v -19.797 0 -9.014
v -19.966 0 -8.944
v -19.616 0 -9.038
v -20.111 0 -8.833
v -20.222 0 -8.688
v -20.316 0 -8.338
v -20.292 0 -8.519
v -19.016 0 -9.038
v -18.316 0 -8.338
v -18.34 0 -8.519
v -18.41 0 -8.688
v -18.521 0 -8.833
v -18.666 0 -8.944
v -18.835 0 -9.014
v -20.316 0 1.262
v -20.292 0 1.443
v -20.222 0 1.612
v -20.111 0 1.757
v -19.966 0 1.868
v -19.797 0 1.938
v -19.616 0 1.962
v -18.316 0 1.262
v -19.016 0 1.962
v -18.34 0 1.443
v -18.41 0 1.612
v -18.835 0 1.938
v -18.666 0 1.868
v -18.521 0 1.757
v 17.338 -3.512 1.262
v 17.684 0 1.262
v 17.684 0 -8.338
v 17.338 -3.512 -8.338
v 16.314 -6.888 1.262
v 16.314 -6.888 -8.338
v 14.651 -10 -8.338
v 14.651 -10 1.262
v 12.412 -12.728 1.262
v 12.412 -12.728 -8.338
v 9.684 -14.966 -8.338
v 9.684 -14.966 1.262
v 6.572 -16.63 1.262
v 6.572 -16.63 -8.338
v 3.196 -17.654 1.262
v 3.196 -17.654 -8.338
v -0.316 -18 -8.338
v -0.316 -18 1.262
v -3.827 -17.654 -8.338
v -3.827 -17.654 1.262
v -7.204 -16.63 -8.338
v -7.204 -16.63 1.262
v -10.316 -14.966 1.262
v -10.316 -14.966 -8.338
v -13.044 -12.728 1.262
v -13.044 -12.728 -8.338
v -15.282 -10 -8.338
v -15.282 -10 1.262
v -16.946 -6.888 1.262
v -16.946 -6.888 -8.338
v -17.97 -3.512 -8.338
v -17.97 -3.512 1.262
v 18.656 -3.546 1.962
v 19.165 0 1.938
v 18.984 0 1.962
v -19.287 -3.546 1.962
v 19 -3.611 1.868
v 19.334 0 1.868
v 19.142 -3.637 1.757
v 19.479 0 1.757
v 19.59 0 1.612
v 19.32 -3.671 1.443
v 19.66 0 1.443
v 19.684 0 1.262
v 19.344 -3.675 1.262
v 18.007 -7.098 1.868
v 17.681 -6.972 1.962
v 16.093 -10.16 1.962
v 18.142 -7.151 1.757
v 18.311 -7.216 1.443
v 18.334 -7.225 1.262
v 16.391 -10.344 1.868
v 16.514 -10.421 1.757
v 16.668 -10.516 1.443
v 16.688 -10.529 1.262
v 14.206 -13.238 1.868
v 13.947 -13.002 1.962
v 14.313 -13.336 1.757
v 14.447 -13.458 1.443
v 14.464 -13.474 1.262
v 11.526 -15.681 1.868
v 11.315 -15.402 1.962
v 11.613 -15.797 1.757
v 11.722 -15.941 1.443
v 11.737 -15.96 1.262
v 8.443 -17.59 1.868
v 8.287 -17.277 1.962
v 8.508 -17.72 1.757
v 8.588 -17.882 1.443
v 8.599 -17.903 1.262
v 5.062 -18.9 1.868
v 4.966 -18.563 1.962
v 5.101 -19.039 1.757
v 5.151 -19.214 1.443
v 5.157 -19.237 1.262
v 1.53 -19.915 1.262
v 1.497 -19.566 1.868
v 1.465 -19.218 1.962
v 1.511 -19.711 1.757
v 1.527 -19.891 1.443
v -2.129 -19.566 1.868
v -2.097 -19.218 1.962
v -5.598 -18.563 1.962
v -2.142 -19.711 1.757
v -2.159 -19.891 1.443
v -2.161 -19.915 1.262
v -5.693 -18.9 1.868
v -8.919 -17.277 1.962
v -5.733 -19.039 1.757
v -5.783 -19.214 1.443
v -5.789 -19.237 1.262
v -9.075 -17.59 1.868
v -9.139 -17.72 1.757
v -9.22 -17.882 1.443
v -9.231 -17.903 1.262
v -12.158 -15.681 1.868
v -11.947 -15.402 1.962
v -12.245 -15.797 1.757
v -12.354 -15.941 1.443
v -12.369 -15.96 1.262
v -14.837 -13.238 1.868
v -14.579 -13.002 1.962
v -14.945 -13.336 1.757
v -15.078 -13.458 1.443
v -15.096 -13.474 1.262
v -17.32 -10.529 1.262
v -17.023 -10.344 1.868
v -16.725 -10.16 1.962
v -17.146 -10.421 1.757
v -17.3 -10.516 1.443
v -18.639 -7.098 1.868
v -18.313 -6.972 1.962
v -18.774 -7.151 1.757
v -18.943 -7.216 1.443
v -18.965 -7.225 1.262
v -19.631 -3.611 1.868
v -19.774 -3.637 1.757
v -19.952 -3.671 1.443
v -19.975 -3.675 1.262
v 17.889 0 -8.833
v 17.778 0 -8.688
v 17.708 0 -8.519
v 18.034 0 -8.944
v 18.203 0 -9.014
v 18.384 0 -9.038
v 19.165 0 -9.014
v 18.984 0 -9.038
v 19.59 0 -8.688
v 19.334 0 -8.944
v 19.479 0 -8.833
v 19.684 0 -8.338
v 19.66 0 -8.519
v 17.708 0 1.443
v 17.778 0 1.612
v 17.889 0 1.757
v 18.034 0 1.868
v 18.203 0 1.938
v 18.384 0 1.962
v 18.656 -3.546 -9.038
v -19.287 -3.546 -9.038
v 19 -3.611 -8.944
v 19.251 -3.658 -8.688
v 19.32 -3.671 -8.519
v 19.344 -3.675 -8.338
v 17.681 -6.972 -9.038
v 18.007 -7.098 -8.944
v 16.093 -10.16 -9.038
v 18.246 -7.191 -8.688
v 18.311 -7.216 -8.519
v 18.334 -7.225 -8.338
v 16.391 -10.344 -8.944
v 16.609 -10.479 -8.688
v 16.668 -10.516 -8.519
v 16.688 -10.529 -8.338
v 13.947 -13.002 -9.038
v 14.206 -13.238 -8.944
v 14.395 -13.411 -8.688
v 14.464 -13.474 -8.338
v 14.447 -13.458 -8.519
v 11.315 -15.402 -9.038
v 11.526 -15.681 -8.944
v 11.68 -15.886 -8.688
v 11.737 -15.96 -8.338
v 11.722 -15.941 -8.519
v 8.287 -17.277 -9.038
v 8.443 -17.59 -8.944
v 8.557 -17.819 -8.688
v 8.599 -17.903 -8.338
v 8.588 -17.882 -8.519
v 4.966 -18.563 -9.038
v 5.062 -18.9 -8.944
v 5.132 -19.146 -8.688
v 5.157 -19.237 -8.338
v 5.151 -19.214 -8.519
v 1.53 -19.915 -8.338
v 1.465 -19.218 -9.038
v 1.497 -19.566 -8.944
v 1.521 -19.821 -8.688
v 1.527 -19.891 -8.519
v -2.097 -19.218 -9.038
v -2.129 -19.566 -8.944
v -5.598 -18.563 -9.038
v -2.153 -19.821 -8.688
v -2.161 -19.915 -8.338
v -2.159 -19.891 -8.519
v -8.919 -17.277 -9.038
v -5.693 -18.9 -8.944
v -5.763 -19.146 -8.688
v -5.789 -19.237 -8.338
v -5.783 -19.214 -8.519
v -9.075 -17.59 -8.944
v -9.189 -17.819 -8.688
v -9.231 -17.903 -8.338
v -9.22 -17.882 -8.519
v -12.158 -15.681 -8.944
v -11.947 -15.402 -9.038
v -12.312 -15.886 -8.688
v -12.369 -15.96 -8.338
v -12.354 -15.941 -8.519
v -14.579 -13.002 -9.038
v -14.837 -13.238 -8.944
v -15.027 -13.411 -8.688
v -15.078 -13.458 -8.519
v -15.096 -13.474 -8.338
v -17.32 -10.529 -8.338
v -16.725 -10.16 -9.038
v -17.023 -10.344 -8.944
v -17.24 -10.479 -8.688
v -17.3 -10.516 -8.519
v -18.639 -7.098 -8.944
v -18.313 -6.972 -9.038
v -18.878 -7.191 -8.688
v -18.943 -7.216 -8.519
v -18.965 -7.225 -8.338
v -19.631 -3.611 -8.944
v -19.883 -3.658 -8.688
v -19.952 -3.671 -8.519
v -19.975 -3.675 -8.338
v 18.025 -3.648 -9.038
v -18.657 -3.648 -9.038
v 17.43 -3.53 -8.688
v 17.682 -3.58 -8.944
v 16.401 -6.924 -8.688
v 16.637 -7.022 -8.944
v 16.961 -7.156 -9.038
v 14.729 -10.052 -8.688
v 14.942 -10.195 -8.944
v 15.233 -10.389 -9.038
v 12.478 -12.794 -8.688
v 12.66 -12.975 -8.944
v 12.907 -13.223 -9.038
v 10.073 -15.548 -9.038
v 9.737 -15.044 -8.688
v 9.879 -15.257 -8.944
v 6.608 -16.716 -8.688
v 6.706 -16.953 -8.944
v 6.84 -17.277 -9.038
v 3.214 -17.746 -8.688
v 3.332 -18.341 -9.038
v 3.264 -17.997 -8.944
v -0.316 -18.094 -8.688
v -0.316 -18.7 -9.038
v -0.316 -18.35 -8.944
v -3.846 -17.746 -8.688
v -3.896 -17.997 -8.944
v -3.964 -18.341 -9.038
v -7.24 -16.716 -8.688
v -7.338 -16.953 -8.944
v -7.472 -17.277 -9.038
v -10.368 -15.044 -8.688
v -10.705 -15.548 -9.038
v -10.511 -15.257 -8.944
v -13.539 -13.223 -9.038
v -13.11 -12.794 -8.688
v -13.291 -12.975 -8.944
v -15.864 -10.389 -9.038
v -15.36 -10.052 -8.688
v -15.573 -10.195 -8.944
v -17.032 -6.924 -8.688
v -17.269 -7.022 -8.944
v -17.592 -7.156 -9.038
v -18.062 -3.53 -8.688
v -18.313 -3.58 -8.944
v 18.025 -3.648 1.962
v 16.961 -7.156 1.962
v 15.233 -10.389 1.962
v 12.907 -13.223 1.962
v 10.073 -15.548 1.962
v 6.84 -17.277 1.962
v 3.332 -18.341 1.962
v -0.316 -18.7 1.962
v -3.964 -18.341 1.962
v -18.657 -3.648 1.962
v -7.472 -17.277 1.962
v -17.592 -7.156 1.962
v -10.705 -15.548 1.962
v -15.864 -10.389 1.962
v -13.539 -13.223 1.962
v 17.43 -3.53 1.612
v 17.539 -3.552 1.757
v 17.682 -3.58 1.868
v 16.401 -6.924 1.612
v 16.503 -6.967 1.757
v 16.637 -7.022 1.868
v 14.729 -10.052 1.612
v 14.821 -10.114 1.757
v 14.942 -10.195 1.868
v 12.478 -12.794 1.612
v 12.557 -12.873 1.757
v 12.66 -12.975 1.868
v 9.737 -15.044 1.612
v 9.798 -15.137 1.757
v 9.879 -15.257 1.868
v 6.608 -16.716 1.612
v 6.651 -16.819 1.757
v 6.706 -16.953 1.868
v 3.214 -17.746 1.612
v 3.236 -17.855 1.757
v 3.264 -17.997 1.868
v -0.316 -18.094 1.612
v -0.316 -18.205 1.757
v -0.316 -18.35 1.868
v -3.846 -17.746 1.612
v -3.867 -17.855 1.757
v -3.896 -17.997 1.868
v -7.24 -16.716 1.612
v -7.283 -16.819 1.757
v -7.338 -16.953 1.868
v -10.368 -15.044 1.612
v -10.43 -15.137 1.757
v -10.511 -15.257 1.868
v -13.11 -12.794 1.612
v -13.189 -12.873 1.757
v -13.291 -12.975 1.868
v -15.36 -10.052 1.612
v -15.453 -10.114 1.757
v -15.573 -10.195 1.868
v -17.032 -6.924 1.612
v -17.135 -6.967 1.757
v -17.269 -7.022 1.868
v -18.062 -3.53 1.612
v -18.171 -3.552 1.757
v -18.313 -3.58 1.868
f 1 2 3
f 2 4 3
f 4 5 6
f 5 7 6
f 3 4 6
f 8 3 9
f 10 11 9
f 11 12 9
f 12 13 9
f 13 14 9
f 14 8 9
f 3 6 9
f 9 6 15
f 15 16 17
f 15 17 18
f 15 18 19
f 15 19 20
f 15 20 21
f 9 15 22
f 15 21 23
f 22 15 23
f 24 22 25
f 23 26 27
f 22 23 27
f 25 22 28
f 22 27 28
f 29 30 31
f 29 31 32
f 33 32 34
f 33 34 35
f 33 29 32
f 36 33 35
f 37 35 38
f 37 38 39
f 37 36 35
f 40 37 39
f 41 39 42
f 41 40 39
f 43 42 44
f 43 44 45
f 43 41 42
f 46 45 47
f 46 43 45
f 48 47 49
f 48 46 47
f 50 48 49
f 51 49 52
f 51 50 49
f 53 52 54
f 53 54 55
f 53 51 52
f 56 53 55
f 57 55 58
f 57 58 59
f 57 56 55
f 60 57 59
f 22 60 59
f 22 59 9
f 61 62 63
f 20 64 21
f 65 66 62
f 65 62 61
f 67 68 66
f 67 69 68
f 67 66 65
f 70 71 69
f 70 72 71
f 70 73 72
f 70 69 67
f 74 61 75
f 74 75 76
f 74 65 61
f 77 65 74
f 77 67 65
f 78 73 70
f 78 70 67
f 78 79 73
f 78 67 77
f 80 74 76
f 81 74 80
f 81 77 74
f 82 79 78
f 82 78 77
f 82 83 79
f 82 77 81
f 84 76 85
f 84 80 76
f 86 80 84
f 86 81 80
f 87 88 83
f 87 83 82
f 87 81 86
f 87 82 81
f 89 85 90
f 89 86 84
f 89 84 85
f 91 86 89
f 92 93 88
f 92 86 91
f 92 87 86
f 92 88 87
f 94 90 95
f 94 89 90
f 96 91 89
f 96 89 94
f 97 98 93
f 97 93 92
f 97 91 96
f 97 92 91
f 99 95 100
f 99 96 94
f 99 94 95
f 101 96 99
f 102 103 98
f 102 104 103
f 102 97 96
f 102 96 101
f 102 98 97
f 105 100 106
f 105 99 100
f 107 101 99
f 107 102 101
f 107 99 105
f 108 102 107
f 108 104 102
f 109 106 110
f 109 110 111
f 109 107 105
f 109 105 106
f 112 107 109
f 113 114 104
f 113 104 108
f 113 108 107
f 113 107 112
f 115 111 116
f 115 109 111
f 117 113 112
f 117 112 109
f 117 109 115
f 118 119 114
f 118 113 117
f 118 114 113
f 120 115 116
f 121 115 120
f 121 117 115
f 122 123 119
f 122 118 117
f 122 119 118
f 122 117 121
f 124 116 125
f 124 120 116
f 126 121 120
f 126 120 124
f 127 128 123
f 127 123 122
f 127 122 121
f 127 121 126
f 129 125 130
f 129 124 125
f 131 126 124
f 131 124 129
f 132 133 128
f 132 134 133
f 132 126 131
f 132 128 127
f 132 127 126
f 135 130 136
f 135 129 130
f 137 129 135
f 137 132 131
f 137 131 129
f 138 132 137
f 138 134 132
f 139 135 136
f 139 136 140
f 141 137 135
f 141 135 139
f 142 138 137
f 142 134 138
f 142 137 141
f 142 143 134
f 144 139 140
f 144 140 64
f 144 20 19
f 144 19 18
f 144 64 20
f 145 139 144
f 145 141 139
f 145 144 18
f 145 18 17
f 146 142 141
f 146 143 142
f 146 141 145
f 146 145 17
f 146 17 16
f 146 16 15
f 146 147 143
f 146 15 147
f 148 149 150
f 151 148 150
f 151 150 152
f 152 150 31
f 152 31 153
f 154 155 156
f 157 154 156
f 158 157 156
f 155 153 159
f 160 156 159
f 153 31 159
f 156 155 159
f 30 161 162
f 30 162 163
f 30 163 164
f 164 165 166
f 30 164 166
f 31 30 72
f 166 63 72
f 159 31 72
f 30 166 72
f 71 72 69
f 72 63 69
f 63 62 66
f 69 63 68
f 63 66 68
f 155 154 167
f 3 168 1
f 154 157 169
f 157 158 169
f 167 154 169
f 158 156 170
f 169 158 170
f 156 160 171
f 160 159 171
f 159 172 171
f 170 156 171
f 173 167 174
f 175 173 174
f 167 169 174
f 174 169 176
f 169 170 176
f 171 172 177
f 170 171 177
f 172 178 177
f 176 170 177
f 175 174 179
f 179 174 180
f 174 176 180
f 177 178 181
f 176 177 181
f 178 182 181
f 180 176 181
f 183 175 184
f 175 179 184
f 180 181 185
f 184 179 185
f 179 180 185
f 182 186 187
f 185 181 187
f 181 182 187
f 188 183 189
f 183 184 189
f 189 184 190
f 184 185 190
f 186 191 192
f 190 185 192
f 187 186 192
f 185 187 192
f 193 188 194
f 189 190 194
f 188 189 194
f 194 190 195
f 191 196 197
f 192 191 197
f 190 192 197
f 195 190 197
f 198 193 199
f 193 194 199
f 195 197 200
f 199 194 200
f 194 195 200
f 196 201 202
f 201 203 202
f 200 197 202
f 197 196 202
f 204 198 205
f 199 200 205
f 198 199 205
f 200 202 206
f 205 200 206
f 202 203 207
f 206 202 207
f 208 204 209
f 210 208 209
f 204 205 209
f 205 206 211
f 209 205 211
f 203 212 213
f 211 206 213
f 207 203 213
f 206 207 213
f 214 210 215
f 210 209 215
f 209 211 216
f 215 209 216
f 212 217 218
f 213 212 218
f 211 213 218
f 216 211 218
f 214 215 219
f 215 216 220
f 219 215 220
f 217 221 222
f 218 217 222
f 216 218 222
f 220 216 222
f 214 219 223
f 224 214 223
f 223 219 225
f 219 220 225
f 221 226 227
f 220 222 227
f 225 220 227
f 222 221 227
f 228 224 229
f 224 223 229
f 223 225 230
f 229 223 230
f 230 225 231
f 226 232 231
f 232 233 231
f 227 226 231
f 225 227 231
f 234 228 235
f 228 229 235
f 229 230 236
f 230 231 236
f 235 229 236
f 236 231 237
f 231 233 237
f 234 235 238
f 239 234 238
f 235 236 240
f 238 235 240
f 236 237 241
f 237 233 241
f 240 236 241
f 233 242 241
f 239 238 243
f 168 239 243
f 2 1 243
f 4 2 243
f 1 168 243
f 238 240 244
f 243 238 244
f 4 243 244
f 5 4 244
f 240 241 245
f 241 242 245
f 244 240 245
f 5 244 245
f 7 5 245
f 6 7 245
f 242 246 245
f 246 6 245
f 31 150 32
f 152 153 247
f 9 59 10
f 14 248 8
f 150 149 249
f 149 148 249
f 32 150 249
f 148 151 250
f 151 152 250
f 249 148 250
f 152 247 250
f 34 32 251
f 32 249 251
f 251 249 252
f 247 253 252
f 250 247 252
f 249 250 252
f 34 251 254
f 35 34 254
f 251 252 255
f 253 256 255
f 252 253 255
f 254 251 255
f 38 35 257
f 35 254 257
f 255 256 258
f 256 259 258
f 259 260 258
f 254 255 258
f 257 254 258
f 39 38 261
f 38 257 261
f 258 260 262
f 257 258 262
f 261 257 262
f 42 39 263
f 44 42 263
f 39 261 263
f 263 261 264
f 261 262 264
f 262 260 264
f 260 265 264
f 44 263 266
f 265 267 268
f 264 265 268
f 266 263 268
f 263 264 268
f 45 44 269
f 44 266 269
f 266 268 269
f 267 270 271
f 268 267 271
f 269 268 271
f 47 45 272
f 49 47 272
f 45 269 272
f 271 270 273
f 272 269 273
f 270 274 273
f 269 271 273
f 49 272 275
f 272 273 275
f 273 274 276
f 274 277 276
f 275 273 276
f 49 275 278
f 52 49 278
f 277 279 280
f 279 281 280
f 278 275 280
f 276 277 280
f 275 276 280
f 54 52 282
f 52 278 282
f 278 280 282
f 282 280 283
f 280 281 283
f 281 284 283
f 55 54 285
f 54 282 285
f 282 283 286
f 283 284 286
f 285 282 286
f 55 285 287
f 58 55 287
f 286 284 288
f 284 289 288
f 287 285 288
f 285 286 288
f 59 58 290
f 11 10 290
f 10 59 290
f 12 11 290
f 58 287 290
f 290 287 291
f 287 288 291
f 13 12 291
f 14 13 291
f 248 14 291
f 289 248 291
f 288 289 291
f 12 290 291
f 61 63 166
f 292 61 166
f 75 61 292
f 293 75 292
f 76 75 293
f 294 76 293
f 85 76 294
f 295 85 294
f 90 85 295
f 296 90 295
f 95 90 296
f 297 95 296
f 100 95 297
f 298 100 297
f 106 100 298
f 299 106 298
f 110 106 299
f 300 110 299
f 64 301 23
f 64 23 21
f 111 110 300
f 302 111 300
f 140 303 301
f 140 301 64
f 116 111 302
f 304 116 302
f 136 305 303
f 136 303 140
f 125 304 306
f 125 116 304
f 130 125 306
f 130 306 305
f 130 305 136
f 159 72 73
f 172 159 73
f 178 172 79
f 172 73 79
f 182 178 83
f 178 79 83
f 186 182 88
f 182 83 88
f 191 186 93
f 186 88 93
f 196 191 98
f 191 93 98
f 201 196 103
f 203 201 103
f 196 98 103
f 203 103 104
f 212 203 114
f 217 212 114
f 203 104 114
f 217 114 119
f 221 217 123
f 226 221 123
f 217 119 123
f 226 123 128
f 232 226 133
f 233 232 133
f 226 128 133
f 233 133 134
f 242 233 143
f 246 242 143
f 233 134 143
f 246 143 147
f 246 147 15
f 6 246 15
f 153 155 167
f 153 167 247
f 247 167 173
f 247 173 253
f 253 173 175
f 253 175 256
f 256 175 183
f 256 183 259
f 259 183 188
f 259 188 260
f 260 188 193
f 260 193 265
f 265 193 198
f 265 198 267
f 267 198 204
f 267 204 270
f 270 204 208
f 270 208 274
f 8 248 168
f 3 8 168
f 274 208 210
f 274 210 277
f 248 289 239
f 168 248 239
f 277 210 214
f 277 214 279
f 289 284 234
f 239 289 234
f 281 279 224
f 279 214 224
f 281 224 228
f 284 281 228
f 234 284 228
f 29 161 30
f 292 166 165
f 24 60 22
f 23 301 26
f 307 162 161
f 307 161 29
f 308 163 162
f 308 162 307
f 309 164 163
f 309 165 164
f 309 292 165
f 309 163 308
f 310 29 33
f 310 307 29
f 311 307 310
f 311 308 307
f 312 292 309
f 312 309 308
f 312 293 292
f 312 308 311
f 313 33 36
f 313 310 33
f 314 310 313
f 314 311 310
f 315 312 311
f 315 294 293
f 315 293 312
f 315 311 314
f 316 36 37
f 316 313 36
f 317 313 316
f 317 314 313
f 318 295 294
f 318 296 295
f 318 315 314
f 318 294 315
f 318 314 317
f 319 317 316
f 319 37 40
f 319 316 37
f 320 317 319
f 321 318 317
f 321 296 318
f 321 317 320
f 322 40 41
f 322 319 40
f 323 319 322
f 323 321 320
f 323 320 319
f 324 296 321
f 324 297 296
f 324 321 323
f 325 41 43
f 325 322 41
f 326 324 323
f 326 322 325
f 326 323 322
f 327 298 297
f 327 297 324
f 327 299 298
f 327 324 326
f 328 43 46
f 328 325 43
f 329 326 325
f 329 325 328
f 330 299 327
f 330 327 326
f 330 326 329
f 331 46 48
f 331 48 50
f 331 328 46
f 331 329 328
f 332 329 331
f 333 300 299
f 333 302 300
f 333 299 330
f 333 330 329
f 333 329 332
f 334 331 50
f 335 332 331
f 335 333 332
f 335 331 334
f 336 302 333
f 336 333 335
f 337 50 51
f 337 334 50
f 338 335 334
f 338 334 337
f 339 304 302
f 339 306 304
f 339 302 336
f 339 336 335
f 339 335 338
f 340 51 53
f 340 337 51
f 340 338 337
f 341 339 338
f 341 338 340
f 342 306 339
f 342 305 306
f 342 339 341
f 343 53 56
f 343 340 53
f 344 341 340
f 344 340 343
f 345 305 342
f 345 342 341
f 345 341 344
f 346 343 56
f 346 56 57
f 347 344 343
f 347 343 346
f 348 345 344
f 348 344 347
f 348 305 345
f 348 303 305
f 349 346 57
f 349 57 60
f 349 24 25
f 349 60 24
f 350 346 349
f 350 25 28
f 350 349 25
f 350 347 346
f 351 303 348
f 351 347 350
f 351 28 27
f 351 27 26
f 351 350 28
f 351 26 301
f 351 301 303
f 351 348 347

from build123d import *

# Parameters (mm, degrees)
F0_W     = 2
F0_H     = 11
F2_W     = 98.8686215132
F2_H     = 62.5401474535
F3_DEPTH = 20.001
F4_R     = 0.7


with BuildPart() as f1:
    # F0 (on Front) → F1 (revolve)
    with BuildSketch(Plane.XZ):
        with Locations((18.6841351639, -3.538246952)):
            Rectangle(F0_W, F0_H)
    revolve(axis=Axis((-0.3158648361, 0, -1.3117180206), (0, 0, -1)))

    # F2 (on Front) → F3 (cut, through all)
    with BuildSketch(Plane.XZ):
        with Locations((-19.5460626855, -2.5687646121)):
            Rectangle(F2_W, F2_H)
    extrude(amount=-F3_DEPTH, mode=Mode.SUBTRACT)

    # F4
    f4_edges = [f1.edges().sort_by_distance(p)[0] for p in [
        (-0.315865, -20, 1.961753),
        (-0.315865, -18, 1.961753),
        (-0.315865, -20, -9.038247),
        (-0.315865, -18, -9.038247),
    ]]
    fillet(f4_edges, radius=F4_R)


solid = f1.part
